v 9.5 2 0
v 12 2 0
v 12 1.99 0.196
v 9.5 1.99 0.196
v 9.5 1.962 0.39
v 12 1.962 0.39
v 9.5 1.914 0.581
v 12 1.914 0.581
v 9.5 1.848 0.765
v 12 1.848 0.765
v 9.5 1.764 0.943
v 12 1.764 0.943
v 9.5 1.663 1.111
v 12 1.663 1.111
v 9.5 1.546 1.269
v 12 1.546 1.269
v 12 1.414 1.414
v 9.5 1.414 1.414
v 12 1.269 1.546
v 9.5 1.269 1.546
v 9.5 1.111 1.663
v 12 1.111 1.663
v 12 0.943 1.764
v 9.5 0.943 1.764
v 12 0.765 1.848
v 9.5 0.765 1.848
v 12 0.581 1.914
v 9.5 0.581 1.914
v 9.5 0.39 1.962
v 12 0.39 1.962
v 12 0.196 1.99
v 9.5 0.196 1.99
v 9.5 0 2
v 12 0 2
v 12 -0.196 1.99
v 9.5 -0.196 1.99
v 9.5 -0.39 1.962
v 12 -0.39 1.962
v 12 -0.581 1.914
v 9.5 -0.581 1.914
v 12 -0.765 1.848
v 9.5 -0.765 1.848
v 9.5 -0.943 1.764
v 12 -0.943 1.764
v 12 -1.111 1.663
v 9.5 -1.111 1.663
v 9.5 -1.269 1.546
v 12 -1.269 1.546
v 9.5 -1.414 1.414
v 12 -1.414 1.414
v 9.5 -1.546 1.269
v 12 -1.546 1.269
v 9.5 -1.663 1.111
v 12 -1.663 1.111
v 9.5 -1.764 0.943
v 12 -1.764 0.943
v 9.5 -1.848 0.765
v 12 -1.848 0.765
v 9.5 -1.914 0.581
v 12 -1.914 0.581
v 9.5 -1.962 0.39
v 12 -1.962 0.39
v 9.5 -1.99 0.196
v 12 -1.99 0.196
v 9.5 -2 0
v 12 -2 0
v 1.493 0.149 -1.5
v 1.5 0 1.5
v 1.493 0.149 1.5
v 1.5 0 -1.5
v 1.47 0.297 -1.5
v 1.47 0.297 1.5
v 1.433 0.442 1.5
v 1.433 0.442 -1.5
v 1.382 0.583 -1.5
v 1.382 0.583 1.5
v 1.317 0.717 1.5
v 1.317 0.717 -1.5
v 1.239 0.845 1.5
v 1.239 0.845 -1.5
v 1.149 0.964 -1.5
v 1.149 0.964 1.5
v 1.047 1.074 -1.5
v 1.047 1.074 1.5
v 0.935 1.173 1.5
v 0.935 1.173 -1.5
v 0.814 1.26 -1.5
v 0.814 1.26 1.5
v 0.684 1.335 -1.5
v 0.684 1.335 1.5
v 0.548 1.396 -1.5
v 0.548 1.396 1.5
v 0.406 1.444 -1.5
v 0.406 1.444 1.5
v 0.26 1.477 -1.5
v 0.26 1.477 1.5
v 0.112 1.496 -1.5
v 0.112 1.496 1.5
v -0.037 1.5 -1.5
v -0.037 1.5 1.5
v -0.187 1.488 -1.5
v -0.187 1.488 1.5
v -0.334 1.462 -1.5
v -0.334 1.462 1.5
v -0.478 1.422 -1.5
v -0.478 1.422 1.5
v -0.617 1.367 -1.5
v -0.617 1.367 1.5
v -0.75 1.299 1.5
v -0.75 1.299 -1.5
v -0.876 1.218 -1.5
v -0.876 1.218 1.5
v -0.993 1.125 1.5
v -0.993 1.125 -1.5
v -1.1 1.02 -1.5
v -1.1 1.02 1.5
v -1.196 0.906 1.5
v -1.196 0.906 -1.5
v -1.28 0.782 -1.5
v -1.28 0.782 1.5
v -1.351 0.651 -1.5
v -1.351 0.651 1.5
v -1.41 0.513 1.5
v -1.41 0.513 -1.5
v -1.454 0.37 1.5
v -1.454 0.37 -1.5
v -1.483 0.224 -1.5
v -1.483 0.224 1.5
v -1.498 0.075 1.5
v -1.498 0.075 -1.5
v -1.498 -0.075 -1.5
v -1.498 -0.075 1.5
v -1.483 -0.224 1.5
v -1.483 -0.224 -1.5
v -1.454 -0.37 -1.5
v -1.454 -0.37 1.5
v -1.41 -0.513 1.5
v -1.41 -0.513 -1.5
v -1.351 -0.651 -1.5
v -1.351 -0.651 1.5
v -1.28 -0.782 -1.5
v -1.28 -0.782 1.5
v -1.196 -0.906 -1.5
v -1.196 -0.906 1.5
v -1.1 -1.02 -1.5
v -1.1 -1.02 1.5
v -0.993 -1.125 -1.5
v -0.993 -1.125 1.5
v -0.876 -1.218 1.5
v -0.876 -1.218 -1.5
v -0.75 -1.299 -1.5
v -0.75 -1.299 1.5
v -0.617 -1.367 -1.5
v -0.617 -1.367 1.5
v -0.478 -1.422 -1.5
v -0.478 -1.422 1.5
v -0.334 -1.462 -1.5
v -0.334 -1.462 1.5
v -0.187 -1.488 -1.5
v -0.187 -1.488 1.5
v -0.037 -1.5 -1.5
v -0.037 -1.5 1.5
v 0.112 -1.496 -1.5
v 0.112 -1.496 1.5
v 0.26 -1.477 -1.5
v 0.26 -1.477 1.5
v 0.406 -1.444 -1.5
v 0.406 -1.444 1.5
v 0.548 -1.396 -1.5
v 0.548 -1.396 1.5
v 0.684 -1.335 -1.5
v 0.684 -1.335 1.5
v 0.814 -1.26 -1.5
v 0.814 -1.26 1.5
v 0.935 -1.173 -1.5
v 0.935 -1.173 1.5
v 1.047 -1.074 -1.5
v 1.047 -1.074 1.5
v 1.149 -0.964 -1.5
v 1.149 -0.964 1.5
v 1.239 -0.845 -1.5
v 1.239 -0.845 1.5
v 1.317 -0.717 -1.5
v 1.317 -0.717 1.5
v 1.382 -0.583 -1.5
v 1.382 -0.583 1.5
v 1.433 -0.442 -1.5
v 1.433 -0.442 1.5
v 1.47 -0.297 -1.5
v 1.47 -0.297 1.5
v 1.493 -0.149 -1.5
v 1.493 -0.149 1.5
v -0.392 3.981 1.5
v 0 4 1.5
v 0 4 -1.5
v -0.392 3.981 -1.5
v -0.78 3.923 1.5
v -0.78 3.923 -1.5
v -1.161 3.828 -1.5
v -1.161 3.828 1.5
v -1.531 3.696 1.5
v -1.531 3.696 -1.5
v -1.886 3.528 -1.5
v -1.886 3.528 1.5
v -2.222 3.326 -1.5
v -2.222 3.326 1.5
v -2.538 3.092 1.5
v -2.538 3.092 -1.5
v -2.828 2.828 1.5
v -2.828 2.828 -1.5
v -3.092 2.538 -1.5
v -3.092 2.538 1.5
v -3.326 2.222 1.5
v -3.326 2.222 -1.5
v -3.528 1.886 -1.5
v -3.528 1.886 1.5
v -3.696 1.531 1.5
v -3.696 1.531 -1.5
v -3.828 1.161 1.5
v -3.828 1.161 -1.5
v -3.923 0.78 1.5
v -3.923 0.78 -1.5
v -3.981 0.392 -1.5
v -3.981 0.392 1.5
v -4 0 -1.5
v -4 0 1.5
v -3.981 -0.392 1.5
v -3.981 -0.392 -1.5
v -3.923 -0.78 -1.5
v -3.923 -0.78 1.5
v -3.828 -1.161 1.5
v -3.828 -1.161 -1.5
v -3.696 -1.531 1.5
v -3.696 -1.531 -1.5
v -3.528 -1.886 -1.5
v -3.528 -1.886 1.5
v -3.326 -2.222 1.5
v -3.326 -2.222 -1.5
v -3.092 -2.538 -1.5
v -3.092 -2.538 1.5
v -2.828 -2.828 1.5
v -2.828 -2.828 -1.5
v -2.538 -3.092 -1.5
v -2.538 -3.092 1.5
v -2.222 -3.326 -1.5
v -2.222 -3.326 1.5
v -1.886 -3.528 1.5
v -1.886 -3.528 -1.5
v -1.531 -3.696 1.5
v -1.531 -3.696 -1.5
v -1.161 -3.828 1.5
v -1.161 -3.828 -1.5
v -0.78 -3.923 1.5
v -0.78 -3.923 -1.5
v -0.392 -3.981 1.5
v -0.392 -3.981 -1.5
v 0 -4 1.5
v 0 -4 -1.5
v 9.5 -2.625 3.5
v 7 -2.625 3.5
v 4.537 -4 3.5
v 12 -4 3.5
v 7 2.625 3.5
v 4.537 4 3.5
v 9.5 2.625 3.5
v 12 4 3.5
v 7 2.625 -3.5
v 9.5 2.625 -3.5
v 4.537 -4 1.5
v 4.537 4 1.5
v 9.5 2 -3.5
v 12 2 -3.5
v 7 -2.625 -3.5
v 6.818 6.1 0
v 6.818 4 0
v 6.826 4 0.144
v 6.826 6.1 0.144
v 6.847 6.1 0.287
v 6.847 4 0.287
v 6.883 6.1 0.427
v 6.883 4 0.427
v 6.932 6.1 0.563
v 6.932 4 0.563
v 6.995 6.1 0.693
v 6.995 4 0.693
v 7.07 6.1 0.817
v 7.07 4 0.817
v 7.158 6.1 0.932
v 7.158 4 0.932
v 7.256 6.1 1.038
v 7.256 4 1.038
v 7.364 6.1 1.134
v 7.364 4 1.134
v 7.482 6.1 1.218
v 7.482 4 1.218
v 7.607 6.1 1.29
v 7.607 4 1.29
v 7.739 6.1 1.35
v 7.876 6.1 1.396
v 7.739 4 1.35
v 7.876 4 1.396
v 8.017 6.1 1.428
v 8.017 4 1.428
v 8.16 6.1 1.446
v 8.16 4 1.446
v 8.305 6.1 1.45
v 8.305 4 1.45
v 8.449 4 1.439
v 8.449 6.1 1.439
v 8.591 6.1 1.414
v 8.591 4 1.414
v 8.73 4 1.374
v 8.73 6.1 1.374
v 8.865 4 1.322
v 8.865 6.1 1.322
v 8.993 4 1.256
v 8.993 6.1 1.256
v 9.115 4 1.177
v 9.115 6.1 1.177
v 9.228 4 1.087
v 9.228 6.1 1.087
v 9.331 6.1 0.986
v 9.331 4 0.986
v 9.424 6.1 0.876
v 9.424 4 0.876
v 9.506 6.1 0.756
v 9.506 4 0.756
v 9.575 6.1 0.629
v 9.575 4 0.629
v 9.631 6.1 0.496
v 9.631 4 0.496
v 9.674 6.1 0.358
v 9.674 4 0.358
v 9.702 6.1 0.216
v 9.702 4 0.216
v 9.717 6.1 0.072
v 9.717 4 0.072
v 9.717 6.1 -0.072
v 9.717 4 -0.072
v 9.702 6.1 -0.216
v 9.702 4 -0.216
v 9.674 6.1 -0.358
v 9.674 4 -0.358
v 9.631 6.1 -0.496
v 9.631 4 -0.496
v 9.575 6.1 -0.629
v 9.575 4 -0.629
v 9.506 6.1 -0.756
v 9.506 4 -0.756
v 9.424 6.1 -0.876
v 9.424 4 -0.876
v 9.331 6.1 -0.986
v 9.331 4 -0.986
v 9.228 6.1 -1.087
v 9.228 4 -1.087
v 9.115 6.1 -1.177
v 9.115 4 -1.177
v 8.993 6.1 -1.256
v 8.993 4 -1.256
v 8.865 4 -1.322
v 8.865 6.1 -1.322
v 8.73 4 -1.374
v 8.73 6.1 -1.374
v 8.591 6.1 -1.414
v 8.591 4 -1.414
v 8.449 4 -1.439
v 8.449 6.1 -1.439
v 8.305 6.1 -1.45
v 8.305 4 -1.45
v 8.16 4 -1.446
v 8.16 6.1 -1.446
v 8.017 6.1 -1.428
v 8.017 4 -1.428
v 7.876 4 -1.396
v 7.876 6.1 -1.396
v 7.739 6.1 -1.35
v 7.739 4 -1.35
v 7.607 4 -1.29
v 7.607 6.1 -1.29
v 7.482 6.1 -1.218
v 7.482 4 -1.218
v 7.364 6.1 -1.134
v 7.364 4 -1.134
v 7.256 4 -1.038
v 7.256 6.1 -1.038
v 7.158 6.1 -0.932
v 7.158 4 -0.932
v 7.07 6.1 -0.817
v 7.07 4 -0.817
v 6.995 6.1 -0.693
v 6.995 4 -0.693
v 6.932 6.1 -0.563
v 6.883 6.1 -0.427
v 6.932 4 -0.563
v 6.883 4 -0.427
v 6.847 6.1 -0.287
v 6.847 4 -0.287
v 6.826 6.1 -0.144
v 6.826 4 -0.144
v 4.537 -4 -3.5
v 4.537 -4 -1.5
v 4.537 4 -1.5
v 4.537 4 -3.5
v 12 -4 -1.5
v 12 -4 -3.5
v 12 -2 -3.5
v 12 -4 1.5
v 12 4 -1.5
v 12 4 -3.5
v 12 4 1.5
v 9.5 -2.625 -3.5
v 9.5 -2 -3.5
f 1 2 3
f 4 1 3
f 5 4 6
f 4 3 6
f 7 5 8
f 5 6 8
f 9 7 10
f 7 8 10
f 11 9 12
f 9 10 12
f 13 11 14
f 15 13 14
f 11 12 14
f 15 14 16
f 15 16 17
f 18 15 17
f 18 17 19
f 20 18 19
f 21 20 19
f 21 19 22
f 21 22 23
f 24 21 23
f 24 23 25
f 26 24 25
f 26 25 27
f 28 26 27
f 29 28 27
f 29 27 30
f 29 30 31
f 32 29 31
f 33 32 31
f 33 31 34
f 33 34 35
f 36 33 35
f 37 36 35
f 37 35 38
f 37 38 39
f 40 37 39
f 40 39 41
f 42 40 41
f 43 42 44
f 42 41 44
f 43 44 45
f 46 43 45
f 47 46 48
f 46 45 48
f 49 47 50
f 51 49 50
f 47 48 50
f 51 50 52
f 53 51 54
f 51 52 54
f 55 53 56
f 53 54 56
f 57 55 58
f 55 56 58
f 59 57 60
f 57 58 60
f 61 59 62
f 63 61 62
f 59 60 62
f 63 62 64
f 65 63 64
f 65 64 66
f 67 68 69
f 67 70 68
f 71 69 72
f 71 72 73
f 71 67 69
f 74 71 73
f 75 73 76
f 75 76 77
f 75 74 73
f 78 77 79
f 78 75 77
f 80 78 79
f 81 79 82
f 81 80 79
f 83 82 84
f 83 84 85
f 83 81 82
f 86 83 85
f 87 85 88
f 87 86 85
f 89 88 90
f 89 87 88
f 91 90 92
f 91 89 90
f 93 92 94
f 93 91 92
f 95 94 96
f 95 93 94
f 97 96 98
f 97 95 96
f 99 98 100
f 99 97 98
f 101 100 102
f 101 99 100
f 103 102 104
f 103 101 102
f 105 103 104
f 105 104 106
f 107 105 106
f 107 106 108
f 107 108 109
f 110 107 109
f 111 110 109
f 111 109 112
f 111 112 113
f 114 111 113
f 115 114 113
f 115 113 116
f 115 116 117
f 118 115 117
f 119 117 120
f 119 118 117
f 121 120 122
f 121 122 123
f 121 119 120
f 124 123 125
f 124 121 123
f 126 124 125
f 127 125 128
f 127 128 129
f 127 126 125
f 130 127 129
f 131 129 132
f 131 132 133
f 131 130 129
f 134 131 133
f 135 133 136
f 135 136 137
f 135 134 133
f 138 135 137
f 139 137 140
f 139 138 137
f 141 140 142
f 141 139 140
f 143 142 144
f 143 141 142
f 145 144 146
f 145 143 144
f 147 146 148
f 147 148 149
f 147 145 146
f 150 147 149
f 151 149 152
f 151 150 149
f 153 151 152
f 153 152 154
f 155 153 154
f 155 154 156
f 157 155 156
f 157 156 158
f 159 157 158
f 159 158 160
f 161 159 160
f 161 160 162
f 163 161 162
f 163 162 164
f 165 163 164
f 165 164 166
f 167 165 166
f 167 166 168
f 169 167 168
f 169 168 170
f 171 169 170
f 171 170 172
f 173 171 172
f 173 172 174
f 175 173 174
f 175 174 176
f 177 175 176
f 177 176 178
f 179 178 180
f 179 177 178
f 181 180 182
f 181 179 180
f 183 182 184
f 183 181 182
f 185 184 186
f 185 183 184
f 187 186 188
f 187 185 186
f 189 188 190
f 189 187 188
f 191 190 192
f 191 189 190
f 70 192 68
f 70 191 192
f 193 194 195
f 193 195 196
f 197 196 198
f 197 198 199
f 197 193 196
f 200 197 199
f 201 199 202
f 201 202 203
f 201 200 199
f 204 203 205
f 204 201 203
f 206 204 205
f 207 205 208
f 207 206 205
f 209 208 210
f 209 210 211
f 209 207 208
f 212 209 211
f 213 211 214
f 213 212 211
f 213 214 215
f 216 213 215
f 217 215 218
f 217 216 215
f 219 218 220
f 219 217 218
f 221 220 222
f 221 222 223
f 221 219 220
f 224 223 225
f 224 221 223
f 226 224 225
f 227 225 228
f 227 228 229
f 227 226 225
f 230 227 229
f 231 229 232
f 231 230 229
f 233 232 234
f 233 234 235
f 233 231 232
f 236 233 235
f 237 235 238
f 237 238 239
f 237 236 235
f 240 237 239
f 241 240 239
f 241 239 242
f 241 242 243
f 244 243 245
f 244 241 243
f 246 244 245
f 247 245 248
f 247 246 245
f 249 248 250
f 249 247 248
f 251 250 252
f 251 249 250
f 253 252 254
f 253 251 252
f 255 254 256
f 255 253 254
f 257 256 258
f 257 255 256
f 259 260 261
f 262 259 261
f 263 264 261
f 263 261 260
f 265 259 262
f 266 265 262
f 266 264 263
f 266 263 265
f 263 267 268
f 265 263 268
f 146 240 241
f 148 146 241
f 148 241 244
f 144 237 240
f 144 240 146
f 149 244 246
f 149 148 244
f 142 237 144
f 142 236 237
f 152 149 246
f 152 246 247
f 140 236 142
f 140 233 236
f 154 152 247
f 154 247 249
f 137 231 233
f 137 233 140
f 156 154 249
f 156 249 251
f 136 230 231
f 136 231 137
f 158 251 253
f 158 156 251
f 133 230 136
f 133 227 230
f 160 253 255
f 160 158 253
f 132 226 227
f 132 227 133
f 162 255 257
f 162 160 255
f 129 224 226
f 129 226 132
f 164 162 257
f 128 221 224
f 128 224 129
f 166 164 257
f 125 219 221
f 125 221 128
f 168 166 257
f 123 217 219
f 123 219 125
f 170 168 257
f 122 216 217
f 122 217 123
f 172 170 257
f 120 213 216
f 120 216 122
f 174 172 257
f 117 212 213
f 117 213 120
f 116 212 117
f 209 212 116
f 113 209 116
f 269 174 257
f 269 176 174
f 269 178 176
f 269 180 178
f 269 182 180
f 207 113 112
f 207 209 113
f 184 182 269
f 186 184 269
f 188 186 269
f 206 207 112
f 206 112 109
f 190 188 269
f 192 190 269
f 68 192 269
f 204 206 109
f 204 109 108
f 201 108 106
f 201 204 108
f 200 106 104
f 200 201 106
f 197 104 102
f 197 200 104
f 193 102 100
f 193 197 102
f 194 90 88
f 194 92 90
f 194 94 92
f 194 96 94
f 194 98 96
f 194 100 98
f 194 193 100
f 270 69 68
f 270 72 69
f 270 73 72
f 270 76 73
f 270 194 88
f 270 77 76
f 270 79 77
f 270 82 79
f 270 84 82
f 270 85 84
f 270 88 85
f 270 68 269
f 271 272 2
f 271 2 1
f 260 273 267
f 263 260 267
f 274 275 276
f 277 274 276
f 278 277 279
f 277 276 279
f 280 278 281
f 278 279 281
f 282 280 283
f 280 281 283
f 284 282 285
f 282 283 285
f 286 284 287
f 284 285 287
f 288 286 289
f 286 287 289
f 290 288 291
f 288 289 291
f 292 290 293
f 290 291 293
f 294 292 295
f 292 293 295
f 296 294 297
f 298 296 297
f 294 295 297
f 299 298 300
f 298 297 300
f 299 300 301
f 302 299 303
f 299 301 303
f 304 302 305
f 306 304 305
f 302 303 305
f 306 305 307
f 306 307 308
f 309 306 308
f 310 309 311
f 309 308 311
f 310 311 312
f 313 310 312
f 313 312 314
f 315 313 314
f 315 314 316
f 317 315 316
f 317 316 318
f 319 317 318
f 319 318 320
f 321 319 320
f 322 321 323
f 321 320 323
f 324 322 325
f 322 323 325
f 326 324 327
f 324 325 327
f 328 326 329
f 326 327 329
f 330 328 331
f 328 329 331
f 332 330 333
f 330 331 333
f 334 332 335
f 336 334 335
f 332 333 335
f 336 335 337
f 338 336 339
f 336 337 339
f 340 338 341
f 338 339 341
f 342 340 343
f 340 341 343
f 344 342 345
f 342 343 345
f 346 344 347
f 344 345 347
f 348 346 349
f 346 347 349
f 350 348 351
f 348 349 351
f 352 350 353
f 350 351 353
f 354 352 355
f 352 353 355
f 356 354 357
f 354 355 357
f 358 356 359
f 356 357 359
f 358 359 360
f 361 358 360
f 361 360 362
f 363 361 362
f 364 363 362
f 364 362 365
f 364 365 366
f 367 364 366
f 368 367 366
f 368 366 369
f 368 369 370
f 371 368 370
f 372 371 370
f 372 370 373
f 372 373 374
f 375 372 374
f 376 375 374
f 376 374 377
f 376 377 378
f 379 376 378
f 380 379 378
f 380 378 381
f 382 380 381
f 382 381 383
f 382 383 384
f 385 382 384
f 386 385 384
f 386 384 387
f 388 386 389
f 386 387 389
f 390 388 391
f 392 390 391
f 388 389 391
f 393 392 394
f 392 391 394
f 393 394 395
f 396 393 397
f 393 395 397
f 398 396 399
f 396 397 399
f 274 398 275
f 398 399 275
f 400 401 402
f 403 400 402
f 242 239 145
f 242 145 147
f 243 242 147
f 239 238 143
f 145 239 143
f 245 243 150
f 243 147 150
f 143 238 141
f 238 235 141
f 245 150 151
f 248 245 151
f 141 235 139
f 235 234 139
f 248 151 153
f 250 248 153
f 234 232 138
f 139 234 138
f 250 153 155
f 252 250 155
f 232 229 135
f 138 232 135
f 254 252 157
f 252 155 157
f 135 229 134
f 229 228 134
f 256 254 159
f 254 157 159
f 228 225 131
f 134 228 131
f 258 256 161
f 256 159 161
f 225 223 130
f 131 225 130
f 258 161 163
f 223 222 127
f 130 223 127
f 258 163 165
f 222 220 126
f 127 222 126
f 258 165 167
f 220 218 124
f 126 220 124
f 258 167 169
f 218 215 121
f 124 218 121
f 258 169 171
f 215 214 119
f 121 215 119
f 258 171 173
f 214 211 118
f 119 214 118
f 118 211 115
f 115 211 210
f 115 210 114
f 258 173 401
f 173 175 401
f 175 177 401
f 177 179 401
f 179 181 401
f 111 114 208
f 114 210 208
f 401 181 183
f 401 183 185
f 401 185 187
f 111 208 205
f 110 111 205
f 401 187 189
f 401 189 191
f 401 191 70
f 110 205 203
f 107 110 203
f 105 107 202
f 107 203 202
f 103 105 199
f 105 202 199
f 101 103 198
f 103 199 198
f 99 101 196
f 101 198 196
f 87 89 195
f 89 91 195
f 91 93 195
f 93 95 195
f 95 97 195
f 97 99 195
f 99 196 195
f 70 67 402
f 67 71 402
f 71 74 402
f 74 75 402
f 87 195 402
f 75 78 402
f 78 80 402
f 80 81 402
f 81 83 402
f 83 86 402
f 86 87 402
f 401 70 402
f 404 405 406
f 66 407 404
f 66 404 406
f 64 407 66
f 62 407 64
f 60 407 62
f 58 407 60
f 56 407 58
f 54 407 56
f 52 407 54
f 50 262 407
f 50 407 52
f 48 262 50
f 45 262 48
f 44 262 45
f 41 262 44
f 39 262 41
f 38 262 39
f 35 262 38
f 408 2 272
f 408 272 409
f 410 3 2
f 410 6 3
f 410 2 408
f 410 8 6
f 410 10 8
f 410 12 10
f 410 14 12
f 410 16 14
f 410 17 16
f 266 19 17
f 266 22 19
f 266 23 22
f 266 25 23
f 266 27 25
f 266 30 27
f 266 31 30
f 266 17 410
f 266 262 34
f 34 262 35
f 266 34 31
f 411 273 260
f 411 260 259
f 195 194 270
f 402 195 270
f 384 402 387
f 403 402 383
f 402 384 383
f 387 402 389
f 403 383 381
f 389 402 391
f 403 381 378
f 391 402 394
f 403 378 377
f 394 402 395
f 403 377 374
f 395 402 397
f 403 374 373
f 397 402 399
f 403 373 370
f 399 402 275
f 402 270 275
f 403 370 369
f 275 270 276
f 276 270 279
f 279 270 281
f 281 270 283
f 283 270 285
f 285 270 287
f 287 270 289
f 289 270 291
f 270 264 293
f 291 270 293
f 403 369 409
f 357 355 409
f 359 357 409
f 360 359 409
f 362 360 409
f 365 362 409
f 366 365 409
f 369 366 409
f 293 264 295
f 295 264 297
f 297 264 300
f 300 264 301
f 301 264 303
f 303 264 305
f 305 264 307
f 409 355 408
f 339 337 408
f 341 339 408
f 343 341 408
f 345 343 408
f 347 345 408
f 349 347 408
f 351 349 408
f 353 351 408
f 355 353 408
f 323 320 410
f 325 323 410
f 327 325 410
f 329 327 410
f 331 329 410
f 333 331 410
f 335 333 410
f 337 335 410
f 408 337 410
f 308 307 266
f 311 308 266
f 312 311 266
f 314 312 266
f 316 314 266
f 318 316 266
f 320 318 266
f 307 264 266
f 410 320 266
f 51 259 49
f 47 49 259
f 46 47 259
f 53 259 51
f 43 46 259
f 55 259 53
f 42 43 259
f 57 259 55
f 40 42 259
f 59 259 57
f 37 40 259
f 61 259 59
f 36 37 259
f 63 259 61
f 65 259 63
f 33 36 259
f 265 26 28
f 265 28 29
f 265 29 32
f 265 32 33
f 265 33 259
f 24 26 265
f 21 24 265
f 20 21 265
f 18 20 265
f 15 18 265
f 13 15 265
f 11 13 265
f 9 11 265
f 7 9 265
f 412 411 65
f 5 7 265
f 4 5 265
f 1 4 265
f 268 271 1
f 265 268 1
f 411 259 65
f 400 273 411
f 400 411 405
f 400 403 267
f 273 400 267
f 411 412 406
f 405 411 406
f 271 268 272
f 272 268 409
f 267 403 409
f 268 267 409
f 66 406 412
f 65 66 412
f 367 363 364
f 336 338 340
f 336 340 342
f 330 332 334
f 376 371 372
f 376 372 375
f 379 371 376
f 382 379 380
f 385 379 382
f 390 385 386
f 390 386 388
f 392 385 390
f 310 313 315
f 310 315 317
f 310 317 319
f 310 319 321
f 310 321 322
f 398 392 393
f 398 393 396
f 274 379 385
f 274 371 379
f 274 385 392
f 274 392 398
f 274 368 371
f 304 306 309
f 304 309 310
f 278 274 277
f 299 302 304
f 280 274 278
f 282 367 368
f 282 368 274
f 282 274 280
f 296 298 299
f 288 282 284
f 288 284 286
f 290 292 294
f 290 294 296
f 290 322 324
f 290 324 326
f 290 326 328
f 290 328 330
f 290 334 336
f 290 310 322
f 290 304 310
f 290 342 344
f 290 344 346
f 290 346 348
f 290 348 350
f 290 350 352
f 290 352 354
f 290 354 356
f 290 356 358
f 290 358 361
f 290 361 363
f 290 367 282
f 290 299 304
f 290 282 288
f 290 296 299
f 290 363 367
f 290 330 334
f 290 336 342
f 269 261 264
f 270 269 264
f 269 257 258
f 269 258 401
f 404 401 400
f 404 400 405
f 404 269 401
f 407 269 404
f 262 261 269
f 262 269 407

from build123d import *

# Parameters (mm, degrees)
SKETCH1_R               = 1.5
BOSS_EXTRUDE1_DEPTH     = 1.5
SKETCH5_W               = 7.463090523
SKETCH5_H               = 8
BOSS_EXTRUDE2_DEPTH     = 3.5
CUT_EXTRUDE1_DEPTH      = 7
CUT_EXTRUDE1_DEPTH_BACK = 6
SKETCH2_W               = 2.5
SKETCH2_H               = 5.25
SKETCH3_R               = 2
CUT_EXTRUDE2_DEPTH      = 3
SKETCH6_W               = 5
SKETCH6_H               = 4
CUT_EXTRUDE3_DEPTH      = 3.5
SKETCH7_R               = 1.45
BOSS_EXTRUDE3_DEPTH     = 2.1


with BuildPart() as part:
    # Sketch1 → Boss-Extrude1 (new, symmetric)
    with BuildSketch(Plane.XY):
        with BuildLine():
            Line((12, 4), (0, 4))
            ThreePointArc((0, 4), (-4, 0), (0, -4))
            Line((0, -4), (12, -4))
            Line((12, -4), (12, 4))
        make_face()
        Circle(SKETCH1_R, mode=Mode.SUBTRACT)
    extrude(amount=BOSS_EXTRUDE1_DEPTH, both=True)

    # Sketch5 → Boss-Extrude2 (add, symmetric)
    with BuildSketch(Plane.XY):
        with Locations((8.268454739, 0)):
            Rectangle(SKETCH5_W, SKETCH5_H)
    extrude(amount=BOSS_EXTRUDE2_DEPTH, both=True)

    # Sketch2 → Cut-Extrude1 (cut, two sides: drawn at the far end of the back side and taken through both)
    with BuildSketch(Plane.XY.offset(1.5).offset(-CUT_EXTRUDE1_DEPTH_BACK)):
        with Locations((8.25, 0)):
            Rectangle(SKETCH2_W, SKETCH2_H)
    extrude(amount=CUT_EXTRUDE1_DEPTH + CUT_EXTRUDE1_DEPTH_BACK, mode=Mode.SUBTRACT)

    # Sketch3 → Cut-Extrude2 (cut)
    with BuildSketch(Plane(origin=(12, 0, 0), x_dir=(0, 0, -1), z_dir=(1, 0, 0))):
        with Locations(Location((0, 0, 0), (0, 0, 90))):
            Circle(SKETCH3_R)
    extrude(amount=-CUT_EXTRUDE2_DEPTH, mode=Mode.SUBTRACT)

    # Sketch6 → Cut-Extrude3 (cut)
    with BuildSketch(Plane(origin=(0, 0, -3.5), x_dir=(-1, 0, 0), z_dir=(0, 0, -1))):
        with Locations((-12, 0)):
            Rectangle(SKETCH6_W, SKETCH6_H)
    extrude(amount=-CUT_EXTRUDE3_DEPTH, mode=Mode.SUBTRACT)

    # Sketch7 → Boss-Extrude3 (add)
    with BuildSketch(Plane(origin=(0, 4, 0), x_dir=(1, 0, 0), z_dir=(0, 1, 0))):
        with Locations(Location((8.268454739, 0, 0), (0, 0, 180))):
            Circle(SKETCH7_R)
    extrude(amount=BOSS_EXTRUDE3_DEPTH)


solid = part.part
